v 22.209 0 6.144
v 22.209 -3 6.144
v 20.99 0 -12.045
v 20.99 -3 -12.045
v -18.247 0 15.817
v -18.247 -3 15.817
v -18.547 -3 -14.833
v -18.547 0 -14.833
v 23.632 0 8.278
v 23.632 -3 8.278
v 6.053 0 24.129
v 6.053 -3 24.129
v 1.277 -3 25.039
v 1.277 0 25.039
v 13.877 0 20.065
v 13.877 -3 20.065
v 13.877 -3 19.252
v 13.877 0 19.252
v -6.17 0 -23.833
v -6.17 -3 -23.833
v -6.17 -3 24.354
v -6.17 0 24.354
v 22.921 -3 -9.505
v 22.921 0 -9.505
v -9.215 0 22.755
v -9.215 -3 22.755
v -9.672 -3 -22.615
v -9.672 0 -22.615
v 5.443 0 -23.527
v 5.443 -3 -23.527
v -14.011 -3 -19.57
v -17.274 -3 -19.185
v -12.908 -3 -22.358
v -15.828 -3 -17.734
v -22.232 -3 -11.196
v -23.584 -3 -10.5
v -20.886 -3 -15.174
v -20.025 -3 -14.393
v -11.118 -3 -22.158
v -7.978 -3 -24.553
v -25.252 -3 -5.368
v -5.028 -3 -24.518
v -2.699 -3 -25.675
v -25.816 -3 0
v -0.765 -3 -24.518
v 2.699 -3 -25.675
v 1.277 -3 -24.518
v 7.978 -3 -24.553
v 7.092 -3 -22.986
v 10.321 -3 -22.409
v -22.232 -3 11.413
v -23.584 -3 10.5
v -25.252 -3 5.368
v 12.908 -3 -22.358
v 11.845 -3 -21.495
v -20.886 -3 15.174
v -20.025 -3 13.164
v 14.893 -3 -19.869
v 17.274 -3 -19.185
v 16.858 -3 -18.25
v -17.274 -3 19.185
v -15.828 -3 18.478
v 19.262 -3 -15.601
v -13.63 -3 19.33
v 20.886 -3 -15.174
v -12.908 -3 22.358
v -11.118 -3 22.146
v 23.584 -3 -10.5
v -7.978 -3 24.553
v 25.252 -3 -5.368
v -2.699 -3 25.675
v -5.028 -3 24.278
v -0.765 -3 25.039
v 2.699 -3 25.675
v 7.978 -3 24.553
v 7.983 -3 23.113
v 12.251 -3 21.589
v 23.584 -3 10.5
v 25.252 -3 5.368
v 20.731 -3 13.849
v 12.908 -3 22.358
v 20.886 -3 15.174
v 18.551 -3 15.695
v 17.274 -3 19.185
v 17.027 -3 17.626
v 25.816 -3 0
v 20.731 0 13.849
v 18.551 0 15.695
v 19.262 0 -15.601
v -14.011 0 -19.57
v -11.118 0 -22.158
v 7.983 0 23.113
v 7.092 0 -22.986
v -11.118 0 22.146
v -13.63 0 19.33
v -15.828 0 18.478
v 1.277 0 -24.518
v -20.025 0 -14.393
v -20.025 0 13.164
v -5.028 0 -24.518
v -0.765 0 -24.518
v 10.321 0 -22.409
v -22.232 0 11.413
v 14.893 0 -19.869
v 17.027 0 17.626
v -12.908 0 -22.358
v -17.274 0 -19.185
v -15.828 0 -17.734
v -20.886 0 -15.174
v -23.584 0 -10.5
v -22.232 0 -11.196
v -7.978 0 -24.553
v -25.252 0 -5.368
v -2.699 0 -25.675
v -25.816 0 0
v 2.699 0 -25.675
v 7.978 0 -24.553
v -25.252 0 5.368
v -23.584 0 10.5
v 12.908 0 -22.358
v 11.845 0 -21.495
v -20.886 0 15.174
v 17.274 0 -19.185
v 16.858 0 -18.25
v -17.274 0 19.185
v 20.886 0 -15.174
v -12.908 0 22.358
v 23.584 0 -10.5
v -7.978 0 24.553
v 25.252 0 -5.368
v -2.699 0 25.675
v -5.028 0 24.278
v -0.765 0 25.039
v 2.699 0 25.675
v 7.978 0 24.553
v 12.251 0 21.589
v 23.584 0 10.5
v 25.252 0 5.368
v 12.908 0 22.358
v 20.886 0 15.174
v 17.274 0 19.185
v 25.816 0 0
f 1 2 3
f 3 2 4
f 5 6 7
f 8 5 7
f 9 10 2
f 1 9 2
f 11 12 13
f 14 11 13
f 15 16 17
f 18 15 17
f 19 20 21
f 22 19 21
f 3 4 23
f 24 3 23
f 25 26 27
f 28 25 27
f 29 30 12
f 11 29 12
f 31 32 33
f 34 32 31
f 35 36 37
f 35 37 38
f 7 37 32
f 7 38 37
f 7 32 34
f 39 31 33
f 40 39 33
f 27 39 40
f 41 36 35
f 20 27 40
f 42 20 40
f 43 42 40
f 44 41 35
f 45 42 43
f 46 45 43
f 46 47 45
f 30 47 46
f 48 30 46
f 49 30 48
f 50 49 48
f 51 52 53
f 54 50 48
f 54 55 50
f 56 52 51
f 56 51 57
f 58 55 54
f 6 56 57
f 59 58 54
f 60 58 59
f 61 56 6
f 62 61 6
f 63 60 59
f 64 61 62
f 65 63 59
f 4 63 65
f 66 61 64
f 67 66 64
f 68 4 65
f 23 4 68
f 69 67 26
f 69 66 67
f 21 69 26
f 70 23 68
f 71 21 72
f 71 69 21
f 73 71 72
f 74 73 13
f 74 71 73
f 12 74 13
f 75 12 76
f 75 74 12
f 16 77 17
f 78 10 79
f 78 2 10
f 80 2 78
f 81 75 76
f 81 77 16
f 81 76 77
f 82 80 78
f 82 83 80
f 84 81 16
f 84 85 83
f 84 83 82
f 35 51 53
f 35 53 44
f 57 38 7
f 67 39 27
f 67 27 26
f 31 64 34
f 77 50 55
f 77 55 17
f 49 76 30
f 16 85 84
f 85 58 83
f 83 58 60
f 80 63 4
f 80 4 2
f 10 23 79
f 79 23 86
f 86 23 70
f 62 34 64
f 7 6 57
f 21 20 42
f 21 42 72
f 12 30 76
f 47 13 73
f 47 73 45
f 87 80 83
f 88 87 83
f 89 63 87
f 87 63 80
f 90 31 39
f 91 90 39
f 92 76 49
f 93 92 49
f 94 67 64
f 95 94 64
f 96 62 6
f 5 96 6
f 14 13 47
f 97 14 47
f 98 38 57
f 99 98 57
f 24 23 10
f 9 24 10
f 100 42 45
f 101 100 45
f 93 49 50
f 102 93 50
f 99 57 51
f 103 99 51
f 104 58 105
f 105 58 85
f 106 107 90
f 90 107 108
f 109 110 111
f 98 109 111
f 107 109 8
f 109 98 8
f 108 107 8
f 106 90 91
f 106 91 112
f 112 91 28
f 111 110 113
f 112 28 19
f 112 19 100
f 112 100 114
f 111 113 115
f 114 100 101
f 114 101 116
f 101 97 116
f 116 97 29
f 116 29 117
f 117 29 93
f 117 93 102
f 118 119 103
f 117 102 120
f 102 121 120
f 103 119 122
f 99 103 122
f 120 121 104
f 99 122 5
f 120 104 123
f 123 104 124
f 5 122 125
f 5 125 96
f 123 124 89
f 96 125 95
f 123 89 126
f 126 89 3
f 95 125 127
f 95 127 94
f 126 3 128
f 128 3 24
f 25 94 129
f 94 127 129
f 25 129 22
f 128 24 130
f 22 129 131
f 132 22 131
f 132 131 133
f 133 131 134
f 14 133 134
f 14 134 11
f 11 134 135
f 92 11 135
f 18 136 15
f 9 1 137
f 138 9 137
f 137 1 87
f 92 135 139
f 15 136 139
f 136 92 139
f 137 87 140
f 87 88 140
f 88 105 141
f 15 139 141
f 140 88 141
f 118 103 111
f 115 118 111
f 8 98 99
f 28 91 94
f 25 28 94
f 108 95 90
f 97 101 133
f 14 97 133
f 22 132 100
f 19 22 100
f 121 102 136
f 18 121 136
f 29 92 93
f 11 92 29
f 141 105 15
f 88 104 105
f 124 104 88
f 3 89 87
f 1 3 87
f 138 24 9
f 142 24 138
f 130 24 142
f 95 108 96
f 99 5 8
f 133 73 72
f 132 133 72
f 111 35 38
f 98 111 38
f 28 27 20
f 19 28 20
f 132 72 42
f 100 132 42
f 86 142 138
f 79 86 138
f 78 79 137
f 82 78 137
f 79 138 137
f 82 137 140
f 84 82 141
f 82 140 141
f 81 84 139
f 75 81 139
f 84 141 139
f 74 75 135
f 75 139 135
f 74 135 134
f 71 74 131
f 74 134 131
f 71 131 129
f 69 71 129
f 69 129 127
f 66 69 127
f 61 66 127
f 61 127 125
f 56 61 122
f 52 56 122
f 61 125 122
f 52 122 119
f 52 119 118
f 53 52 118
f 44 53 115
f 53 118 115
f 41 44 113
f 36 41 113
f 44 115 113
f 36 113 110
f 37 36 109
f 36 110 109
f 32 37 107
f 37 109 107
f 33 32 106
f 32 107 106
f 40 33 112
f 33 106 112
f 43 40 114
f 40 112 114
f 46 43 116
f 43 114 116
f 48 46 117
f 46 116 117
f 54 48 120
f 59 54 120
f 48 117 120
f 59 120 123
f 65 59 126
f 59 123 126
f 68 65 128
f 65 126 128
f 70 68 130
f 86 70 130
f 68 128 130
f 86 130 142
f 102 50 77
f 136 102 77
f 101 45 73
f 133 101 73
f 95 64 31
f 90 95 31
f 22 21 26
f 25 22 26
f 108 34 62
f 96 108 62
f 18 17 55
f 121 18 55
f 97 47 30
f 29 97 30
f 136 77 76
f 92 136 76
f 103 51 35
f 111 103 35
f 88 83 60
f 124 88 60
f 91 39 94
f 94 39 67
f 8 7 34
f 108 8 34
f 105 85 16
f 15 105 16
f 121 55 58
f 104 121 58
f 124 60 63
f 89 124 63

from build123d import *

# Parameters (mm, degrees)
F0_R     = 25.81628
F1_DEPTH = 3
F3_DEPTH = 25
F5_DEPTH = 25


with BuildPart() as f1:
    # F0 (on Front) → F1 (new body)
    with BuildSketch(Plane.XZ):
        Circle(F0_R)
    extrude(amount=F1_DEPTH)

    # F2 (on face) → F3 (cut)
    with BuildSketch(Plane.XZ.offset(3)):
        Polygon((-22.232322, 11.412702), (-22.232322, -11.196028), (-20.024735, -14.393222), (-20.024735, 13.163546), align=None)
        Polygon((-11.118267, 22.146139), (-13.630347, 19.329563), (-14.010966, -19.569632), (-11.118267, -22.157835), align=None)
        Polygon((-6.170227, 24.353726), (-9.215174, 22.755129), (-9.671916, -22.61458), (-6.170227, -23.832556), align=None)
        Polygon((-0.765447, -24.51767), (-0.765447, 25.038838), (-5.028372, 24.277601), (-5.028372, -24.51767), align=None)
        Polygon((5.443127, -23.527138), (6.052805, 24.129314), (1.276998, 25.038838), (1.276998, -24.51767), align=None)
        Polygon((12.251193, 21.588992), (7.98345, 23.113187), (7.092044, -22.985913), (10.320548, -22.409394), align=None)
        Polygon((17.026998, 17.62609), (13.876999, 20.064799), (13.876999, 19.251894), (11.844741, -21.49488), (14.893129, -19.869074), align=None)
        Polygon((20.731321, 13.848901), (18.551191, 15.695445), (16.85815, -18.250049), (19.262481, -15.60133), align=None)
        Polygon((23.631837, 8.277702), (22.209259, 6.143831), (20.9899, -12.04488), (22.920547, -9.504557), align=None)
    extrude(amount=-F3_DEPTH, mode=Mode.SUBTRACT)

    # F4 (on face) → F5 (cut)
    with BuildSketch(Plane.XZ.offset(3)):
        Polygon((-15.8276, 18.478015), (-18.247107, 15.816556), (-18.547006, -14.833115), (-15.8276, -17.733933), align=None)
    extrude(amount=-F5_DEPTH, mode=Mode.SUBTRACT)


solid = f1.part
